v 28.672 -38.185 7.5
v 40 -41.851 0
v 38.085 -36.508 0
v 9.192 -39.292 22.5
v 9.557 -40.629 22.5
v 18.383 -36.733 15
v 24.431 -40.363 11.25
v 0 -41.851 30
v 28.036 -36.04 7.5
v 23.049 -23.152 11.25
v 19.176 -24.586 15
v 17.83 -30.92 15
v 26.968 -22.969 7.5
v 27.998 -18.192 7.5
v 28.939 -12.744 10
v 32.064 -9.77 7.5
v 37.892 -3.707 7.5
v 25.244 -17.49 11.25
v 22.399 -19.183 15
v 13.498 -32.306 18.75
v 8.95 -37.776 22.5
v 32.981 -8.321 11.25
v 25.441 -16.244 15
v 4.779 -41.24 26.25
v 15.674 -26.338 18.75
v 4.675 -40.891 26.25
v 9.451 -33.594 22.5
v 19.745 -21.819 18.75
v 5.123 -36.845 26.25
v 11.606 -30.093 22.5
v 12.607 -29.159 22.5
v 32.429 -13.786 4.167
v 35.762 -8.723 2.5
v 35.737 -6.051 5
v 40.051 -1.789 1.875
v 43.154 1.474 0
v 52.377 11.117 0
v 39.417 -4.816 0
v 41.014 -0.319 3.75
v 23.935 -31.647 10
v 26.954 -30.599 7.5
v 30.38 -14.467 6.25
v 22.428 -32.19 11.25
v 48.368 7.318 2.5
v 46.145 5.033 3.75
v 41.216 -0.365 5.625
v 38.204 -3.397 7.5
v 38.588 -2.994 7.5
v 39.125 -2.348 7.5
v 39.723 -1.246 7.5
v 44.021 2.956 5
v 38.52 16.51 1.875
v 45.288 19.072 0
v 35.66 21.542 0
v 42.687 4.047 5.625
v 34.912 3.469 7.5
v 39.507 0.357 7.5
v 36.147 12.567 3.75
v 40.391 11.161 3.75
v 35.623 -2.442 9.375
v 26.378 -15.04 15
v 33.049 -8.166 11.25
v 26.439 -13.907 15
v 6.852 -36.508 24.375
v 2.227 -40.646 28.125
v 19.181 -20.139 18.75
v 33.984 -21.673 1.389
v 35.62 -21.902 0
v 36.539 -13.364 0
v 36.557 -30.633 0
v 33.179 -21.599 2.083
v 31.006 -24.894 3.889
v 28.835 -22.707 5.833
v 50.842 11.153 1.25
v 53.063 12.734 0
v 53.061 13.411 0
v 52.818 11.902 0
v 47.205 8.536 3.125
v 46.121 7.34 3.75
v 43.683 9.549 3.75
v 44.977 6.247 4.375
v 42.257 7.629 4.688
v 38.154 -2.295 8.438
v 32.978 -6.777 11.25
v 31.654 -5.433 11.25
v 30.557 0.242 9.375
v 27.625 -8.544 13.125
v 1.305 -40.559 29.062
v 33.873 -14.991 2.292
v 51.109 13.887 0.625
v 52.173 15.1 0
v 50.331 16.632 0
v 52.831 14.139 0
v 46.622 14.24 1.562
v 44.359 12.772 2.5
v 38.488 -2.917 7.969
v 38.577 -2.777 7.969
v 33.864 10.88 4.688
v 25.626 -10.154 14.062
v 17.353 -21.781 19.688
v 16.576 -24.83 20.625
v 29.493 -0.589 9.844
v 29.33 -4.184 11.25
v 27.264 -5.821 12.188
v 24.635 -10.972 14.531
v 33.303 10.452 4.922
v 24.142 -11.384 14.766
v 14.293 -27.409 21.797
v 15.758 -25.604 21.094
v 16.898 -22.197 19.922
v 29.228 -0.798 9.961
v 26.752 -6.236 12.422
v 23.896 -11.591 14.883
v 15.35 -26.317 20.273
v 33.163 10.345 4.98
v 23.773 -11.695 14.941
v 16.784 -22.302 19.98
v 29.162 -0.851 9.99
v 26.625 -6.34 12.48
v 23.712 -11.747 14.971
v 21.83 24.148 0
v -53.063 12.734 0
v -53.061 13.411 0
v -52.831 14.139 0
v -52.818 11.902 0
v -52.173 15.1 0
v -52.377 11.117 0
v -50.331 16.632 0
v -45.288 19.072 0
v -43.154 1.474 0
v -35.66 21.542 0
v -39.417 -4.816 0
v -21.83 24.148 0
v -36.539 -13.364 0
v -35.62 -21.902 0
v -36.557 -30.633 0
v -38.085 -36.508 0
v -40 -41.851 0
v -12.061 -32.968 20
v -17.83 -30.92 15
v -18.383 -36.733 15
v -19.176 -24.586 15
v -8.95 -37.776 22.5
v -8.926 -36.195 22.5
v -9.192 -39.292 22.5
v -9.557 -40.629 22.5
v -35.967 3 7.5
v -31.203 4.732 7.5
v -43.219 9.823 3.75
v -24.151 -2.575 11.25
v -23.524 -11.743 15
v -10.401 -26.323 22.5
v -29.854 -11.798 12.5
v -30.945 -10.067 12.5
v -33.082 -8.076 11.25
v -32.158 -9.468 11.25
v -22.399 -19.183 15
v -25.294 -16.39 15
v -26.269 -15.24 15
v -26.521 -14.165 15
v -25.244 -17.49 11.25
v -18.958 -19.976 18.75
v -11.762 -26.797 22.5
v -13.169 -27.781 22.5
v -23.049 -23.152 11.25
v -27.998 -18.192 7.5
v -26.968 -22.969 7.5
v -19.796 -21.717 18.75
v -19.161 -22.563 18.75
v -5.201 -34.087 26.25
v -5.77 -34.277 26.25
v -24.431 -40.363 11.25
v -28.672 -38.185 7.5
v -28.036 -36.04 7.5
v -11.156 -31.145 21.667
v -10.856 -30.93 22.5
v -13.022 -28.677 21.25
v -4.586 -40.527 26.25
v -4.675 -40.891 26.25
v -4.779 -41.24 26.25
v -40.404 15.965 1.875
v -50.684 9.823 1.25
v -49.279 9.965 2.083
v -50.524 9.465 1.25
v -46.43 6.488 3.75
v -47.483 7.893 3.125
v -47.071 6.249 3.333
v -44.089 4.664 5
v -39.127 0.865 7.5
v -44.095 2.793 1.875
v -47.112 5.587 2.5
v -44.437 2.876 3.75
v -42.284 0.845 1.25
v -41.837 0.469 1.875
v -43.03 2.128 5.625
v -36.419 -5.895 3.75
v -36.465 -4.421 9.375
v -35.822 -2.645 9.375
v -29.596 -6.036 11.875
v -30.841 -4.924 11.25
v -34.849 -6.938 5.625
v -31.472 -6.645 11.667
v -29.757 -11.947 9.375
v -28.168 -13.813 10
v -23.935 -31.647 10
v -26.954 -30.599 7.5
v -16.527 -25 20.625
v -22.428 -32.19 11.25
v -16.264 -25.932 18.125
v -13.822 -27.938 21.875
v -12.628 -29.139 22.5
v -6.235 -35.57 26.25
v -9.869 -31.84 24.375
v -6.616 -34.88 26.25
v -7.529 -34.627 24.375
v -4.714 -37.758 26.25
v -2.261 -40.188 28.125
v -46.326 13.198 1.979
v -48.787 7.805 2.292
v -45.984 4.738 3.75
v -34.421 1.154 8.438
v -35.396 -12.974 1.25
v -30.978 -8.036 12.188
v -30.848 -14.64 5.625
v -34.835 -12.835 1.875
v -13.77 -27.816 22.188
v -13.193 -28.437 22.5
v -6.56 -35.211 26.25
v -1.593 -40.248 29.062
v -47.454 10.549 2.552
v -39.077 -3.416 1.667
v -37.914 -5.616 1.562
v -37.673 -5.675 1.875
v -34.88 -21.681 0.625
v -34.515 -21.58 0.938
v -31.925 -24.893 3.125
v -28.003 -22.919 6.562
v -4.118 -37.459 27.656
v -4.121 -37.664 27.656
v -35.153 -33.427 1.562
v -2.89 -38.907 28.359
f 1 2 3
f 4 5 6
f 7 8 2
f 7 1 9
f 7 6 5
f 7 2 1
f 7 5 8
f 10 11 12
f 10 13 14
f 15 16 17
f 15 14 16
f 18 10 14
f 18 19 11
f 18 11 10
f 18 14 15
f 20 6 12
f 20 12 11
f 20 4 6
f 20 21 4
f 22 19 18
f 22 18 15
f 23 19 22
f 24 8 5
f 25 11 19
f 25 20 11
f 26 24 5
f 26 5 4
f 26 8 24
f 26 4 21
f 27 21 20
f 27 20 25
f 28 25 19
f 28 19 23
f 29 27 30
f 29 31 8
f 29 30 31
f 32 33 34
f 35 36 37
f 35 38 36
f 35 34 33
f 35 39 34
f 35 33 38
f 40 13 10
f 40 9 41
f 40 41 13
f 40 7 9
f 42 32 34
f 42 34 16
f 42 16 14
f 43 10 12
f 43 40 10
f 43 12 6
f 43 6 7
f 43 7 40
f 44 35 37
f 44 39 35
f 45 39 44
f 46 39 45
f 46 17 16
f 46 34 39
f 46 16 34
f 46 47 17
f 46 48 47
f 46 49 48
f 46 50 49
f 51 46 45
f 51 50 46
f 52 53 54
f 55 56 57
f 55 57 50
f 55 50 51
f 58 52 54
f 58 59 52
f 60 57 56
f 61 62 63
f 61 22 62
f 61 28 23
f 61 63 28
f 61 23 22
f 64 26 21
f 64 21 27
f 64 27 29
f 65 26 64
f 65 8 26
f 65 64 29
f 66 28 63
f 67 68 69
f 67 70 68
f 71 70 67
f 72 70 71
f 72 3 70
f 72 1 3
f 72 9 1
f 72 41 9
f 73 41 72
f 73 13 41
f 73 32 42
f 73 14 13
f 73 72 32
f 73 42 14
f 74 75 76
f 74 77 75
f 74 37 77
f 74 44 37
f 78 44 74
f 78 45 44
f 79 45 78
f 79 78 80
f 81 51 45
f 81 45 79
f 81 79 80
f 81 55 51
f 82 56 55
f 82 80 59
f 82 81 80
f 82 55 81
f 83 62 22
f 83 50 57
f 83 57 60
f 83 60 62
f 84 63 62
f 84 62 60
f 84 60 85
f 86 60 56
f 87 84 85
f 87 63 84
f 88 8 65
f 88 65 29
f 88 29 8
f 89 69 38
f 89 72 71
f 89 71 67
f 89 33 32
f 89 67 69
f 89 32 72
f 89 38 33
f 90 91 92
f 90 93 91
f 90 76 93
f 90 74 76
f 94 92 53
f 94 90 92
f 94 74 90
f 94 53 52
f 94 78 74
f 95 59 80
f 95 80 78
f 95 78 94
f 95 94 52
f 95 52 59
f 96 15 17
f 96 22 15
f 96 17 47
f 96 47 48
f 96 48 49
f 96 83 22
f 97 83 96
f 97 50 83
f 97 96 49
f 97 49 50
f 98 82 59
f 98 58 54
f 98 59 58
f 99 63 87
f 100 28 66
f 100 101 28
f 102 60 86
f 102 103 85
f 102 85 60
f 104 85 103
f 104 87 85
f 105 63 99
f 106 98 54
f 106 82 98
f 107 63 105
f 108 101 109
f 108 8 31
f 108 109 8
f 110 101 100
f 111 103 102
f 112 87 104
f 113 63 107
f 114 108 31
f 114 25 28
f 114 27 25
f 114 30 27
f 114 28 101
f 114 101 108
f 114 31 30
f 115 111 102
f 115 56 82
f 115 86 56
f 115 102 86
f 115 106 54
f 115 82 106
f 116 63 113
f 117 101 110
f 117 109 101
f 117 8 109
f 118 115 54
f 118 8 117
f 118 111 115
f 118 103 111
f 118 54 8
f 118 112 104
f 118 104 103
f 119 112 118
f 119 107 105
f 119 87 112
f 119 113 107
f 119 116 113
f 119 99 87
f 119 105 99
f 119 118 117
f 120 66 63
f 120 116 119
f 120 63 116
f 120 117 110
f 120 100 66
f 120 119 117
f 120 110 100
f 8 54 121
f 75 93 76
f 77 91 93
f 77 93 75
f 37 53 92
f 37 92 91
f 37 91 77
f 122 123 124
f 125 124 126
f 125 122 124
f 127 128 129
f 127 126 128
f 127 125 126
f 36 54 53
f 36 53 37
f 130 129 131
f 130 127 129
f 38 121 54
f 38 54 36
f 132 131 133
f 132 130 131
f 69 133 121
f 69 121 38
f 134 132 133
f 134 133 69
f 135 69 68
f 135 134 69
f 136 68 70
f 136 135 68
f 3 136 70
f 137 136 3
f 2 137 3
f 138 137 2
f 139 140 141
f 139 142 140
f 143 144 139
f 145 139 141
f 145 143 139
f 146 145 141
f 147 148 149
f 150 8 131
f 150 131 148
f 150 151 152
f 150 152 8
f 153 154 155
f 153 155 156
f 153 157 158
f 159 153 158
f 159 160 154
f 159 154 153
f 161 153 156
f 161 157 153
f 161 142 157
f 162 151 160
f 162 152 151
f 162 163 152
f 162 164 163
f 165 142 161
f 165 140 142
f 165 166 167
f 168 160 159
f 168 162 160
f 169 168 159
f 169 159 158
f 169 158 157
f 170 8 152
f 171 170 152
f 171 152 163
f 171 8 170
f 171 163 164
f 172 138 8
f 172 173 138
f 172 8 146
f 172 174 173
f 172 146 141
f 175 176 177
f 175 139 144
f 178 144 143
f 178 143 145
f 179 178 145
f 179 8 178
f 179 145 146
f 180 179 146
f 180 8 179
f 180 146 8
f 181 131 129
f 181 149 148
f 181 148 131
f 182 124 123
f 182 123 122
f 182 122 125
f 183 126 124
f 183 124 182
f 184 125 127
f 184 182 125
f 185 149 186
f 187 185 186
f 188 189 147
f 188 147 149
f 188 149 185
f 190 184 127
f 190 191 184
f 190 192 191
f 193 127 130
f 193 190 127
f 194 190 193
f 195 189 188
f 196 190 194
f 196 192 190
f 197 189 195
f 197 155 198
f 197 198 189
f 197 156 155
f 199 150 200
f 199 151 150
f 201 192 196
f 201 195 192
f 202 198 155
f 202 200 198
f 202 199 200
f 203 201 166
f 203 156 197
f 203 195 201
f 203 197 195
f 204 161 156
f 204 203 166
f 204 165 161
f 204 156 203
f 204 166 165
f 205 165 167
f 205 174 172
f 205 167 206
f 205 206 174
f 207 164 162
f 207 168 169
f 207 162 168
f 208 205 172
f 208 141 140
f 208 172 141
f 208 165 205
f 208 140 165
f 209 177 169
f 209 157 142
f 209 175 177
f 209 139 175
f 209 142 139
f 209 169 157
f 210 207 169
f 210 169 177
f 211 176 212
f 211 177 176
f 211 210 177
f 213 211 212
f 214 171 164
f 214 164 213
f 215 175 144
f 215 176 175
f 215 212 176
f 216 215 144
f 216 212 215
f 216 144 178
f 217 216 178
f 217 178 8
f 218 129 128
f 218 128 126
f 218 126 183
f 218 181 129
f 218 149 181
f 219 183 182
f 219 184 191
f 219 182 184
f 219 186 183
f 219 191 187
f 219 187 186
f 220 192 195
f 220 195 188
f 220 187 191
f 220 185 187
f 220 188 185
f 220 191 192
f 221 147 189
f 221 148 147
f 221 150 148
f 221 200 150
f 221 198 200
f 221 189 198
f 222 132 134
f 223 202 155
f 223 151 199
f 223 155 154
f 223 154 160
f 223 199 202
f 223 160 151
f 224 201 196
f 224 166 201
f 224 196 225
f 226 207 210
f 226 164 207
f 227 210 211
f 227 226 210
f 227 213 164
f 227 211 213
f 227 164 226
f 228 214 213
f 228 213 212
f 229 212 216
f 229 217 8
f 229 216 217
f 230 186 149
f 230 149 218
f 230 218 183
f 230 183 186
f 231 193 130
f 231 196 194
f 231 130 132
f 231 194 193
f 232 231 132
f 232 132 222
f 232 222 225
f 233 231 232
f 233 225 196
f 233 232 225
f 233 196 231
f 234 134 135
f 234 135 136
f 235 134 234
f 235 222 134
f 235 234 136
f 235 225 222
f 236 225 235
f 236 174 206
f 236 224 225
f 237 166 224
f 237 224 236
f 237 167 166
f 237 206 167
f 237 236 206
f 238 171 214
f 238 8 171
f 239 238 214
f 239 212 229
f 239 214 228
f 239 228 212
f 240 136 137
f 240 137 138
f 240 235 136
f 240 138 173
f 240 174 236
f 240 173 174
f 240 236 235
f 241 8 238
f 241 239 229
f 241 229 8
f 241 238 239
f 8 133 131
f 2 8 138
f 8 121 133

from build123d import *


with BuildPart() as f3:
    # F0 (on Top) → F3 section 0
    with BuildSketch(Plane.XY, mode=Mode.PRIVATE) as f3_s0:
        with BuildLine():
            Line((-21.8302697269, 24.1477975046), (-35.6595516205, 21.5416724649))
            add(Edge.make_bspline(
                [(-35.6595516205, 21.5416724649), (-43.5440763831, 20.3296692466), (-59.6029324373, 14.1729042105), (-41.8015409405, 3.8336578149), (-32.9046887709, -19.8407724423), (-37.5337065326, -35.6886010498), (-40, -41.8505555594)],
                knots=[0, 0, 0, 0, 0.2469273066, 0.450304563, 0.7335604216, 1, 1, 1, 1], degree=3))
            Line((-40, -41.8505555594), (0, -41.8505555594))
            Line((0, -41.8505555594), (40, -41.8505555594))
            add(Edge.make_bspline(
                [(35.6595516205, 21.5416724649), (43.5440763831, 20.3296692466), (59.6029324373, 14.1729042105), (41.8015409405, 3.8336578149), (32.9046887709, -19.8407724423), (37.5337065326, -35.6886010498), (40, -41.8505555594)],
                knots=[0, 0, 0, 0, 0.2469273066, 0.450304563, 0.7335604216, 1, 1, 1, 1], degree=3))
            Line((35.6595516205, 21.5416724649), (21.8302697269, 24.1477975046))
            Line((21.8302697269, 24.1477975046), (0, 24.1477975046))
            Line((0, 24.1477975046), (-21.8302697269, 24.1477975046))
        make_face()
    loft([f3_s0.sketch, Vertex(0, -41.8505555594, 30)])


solid = f3.part
